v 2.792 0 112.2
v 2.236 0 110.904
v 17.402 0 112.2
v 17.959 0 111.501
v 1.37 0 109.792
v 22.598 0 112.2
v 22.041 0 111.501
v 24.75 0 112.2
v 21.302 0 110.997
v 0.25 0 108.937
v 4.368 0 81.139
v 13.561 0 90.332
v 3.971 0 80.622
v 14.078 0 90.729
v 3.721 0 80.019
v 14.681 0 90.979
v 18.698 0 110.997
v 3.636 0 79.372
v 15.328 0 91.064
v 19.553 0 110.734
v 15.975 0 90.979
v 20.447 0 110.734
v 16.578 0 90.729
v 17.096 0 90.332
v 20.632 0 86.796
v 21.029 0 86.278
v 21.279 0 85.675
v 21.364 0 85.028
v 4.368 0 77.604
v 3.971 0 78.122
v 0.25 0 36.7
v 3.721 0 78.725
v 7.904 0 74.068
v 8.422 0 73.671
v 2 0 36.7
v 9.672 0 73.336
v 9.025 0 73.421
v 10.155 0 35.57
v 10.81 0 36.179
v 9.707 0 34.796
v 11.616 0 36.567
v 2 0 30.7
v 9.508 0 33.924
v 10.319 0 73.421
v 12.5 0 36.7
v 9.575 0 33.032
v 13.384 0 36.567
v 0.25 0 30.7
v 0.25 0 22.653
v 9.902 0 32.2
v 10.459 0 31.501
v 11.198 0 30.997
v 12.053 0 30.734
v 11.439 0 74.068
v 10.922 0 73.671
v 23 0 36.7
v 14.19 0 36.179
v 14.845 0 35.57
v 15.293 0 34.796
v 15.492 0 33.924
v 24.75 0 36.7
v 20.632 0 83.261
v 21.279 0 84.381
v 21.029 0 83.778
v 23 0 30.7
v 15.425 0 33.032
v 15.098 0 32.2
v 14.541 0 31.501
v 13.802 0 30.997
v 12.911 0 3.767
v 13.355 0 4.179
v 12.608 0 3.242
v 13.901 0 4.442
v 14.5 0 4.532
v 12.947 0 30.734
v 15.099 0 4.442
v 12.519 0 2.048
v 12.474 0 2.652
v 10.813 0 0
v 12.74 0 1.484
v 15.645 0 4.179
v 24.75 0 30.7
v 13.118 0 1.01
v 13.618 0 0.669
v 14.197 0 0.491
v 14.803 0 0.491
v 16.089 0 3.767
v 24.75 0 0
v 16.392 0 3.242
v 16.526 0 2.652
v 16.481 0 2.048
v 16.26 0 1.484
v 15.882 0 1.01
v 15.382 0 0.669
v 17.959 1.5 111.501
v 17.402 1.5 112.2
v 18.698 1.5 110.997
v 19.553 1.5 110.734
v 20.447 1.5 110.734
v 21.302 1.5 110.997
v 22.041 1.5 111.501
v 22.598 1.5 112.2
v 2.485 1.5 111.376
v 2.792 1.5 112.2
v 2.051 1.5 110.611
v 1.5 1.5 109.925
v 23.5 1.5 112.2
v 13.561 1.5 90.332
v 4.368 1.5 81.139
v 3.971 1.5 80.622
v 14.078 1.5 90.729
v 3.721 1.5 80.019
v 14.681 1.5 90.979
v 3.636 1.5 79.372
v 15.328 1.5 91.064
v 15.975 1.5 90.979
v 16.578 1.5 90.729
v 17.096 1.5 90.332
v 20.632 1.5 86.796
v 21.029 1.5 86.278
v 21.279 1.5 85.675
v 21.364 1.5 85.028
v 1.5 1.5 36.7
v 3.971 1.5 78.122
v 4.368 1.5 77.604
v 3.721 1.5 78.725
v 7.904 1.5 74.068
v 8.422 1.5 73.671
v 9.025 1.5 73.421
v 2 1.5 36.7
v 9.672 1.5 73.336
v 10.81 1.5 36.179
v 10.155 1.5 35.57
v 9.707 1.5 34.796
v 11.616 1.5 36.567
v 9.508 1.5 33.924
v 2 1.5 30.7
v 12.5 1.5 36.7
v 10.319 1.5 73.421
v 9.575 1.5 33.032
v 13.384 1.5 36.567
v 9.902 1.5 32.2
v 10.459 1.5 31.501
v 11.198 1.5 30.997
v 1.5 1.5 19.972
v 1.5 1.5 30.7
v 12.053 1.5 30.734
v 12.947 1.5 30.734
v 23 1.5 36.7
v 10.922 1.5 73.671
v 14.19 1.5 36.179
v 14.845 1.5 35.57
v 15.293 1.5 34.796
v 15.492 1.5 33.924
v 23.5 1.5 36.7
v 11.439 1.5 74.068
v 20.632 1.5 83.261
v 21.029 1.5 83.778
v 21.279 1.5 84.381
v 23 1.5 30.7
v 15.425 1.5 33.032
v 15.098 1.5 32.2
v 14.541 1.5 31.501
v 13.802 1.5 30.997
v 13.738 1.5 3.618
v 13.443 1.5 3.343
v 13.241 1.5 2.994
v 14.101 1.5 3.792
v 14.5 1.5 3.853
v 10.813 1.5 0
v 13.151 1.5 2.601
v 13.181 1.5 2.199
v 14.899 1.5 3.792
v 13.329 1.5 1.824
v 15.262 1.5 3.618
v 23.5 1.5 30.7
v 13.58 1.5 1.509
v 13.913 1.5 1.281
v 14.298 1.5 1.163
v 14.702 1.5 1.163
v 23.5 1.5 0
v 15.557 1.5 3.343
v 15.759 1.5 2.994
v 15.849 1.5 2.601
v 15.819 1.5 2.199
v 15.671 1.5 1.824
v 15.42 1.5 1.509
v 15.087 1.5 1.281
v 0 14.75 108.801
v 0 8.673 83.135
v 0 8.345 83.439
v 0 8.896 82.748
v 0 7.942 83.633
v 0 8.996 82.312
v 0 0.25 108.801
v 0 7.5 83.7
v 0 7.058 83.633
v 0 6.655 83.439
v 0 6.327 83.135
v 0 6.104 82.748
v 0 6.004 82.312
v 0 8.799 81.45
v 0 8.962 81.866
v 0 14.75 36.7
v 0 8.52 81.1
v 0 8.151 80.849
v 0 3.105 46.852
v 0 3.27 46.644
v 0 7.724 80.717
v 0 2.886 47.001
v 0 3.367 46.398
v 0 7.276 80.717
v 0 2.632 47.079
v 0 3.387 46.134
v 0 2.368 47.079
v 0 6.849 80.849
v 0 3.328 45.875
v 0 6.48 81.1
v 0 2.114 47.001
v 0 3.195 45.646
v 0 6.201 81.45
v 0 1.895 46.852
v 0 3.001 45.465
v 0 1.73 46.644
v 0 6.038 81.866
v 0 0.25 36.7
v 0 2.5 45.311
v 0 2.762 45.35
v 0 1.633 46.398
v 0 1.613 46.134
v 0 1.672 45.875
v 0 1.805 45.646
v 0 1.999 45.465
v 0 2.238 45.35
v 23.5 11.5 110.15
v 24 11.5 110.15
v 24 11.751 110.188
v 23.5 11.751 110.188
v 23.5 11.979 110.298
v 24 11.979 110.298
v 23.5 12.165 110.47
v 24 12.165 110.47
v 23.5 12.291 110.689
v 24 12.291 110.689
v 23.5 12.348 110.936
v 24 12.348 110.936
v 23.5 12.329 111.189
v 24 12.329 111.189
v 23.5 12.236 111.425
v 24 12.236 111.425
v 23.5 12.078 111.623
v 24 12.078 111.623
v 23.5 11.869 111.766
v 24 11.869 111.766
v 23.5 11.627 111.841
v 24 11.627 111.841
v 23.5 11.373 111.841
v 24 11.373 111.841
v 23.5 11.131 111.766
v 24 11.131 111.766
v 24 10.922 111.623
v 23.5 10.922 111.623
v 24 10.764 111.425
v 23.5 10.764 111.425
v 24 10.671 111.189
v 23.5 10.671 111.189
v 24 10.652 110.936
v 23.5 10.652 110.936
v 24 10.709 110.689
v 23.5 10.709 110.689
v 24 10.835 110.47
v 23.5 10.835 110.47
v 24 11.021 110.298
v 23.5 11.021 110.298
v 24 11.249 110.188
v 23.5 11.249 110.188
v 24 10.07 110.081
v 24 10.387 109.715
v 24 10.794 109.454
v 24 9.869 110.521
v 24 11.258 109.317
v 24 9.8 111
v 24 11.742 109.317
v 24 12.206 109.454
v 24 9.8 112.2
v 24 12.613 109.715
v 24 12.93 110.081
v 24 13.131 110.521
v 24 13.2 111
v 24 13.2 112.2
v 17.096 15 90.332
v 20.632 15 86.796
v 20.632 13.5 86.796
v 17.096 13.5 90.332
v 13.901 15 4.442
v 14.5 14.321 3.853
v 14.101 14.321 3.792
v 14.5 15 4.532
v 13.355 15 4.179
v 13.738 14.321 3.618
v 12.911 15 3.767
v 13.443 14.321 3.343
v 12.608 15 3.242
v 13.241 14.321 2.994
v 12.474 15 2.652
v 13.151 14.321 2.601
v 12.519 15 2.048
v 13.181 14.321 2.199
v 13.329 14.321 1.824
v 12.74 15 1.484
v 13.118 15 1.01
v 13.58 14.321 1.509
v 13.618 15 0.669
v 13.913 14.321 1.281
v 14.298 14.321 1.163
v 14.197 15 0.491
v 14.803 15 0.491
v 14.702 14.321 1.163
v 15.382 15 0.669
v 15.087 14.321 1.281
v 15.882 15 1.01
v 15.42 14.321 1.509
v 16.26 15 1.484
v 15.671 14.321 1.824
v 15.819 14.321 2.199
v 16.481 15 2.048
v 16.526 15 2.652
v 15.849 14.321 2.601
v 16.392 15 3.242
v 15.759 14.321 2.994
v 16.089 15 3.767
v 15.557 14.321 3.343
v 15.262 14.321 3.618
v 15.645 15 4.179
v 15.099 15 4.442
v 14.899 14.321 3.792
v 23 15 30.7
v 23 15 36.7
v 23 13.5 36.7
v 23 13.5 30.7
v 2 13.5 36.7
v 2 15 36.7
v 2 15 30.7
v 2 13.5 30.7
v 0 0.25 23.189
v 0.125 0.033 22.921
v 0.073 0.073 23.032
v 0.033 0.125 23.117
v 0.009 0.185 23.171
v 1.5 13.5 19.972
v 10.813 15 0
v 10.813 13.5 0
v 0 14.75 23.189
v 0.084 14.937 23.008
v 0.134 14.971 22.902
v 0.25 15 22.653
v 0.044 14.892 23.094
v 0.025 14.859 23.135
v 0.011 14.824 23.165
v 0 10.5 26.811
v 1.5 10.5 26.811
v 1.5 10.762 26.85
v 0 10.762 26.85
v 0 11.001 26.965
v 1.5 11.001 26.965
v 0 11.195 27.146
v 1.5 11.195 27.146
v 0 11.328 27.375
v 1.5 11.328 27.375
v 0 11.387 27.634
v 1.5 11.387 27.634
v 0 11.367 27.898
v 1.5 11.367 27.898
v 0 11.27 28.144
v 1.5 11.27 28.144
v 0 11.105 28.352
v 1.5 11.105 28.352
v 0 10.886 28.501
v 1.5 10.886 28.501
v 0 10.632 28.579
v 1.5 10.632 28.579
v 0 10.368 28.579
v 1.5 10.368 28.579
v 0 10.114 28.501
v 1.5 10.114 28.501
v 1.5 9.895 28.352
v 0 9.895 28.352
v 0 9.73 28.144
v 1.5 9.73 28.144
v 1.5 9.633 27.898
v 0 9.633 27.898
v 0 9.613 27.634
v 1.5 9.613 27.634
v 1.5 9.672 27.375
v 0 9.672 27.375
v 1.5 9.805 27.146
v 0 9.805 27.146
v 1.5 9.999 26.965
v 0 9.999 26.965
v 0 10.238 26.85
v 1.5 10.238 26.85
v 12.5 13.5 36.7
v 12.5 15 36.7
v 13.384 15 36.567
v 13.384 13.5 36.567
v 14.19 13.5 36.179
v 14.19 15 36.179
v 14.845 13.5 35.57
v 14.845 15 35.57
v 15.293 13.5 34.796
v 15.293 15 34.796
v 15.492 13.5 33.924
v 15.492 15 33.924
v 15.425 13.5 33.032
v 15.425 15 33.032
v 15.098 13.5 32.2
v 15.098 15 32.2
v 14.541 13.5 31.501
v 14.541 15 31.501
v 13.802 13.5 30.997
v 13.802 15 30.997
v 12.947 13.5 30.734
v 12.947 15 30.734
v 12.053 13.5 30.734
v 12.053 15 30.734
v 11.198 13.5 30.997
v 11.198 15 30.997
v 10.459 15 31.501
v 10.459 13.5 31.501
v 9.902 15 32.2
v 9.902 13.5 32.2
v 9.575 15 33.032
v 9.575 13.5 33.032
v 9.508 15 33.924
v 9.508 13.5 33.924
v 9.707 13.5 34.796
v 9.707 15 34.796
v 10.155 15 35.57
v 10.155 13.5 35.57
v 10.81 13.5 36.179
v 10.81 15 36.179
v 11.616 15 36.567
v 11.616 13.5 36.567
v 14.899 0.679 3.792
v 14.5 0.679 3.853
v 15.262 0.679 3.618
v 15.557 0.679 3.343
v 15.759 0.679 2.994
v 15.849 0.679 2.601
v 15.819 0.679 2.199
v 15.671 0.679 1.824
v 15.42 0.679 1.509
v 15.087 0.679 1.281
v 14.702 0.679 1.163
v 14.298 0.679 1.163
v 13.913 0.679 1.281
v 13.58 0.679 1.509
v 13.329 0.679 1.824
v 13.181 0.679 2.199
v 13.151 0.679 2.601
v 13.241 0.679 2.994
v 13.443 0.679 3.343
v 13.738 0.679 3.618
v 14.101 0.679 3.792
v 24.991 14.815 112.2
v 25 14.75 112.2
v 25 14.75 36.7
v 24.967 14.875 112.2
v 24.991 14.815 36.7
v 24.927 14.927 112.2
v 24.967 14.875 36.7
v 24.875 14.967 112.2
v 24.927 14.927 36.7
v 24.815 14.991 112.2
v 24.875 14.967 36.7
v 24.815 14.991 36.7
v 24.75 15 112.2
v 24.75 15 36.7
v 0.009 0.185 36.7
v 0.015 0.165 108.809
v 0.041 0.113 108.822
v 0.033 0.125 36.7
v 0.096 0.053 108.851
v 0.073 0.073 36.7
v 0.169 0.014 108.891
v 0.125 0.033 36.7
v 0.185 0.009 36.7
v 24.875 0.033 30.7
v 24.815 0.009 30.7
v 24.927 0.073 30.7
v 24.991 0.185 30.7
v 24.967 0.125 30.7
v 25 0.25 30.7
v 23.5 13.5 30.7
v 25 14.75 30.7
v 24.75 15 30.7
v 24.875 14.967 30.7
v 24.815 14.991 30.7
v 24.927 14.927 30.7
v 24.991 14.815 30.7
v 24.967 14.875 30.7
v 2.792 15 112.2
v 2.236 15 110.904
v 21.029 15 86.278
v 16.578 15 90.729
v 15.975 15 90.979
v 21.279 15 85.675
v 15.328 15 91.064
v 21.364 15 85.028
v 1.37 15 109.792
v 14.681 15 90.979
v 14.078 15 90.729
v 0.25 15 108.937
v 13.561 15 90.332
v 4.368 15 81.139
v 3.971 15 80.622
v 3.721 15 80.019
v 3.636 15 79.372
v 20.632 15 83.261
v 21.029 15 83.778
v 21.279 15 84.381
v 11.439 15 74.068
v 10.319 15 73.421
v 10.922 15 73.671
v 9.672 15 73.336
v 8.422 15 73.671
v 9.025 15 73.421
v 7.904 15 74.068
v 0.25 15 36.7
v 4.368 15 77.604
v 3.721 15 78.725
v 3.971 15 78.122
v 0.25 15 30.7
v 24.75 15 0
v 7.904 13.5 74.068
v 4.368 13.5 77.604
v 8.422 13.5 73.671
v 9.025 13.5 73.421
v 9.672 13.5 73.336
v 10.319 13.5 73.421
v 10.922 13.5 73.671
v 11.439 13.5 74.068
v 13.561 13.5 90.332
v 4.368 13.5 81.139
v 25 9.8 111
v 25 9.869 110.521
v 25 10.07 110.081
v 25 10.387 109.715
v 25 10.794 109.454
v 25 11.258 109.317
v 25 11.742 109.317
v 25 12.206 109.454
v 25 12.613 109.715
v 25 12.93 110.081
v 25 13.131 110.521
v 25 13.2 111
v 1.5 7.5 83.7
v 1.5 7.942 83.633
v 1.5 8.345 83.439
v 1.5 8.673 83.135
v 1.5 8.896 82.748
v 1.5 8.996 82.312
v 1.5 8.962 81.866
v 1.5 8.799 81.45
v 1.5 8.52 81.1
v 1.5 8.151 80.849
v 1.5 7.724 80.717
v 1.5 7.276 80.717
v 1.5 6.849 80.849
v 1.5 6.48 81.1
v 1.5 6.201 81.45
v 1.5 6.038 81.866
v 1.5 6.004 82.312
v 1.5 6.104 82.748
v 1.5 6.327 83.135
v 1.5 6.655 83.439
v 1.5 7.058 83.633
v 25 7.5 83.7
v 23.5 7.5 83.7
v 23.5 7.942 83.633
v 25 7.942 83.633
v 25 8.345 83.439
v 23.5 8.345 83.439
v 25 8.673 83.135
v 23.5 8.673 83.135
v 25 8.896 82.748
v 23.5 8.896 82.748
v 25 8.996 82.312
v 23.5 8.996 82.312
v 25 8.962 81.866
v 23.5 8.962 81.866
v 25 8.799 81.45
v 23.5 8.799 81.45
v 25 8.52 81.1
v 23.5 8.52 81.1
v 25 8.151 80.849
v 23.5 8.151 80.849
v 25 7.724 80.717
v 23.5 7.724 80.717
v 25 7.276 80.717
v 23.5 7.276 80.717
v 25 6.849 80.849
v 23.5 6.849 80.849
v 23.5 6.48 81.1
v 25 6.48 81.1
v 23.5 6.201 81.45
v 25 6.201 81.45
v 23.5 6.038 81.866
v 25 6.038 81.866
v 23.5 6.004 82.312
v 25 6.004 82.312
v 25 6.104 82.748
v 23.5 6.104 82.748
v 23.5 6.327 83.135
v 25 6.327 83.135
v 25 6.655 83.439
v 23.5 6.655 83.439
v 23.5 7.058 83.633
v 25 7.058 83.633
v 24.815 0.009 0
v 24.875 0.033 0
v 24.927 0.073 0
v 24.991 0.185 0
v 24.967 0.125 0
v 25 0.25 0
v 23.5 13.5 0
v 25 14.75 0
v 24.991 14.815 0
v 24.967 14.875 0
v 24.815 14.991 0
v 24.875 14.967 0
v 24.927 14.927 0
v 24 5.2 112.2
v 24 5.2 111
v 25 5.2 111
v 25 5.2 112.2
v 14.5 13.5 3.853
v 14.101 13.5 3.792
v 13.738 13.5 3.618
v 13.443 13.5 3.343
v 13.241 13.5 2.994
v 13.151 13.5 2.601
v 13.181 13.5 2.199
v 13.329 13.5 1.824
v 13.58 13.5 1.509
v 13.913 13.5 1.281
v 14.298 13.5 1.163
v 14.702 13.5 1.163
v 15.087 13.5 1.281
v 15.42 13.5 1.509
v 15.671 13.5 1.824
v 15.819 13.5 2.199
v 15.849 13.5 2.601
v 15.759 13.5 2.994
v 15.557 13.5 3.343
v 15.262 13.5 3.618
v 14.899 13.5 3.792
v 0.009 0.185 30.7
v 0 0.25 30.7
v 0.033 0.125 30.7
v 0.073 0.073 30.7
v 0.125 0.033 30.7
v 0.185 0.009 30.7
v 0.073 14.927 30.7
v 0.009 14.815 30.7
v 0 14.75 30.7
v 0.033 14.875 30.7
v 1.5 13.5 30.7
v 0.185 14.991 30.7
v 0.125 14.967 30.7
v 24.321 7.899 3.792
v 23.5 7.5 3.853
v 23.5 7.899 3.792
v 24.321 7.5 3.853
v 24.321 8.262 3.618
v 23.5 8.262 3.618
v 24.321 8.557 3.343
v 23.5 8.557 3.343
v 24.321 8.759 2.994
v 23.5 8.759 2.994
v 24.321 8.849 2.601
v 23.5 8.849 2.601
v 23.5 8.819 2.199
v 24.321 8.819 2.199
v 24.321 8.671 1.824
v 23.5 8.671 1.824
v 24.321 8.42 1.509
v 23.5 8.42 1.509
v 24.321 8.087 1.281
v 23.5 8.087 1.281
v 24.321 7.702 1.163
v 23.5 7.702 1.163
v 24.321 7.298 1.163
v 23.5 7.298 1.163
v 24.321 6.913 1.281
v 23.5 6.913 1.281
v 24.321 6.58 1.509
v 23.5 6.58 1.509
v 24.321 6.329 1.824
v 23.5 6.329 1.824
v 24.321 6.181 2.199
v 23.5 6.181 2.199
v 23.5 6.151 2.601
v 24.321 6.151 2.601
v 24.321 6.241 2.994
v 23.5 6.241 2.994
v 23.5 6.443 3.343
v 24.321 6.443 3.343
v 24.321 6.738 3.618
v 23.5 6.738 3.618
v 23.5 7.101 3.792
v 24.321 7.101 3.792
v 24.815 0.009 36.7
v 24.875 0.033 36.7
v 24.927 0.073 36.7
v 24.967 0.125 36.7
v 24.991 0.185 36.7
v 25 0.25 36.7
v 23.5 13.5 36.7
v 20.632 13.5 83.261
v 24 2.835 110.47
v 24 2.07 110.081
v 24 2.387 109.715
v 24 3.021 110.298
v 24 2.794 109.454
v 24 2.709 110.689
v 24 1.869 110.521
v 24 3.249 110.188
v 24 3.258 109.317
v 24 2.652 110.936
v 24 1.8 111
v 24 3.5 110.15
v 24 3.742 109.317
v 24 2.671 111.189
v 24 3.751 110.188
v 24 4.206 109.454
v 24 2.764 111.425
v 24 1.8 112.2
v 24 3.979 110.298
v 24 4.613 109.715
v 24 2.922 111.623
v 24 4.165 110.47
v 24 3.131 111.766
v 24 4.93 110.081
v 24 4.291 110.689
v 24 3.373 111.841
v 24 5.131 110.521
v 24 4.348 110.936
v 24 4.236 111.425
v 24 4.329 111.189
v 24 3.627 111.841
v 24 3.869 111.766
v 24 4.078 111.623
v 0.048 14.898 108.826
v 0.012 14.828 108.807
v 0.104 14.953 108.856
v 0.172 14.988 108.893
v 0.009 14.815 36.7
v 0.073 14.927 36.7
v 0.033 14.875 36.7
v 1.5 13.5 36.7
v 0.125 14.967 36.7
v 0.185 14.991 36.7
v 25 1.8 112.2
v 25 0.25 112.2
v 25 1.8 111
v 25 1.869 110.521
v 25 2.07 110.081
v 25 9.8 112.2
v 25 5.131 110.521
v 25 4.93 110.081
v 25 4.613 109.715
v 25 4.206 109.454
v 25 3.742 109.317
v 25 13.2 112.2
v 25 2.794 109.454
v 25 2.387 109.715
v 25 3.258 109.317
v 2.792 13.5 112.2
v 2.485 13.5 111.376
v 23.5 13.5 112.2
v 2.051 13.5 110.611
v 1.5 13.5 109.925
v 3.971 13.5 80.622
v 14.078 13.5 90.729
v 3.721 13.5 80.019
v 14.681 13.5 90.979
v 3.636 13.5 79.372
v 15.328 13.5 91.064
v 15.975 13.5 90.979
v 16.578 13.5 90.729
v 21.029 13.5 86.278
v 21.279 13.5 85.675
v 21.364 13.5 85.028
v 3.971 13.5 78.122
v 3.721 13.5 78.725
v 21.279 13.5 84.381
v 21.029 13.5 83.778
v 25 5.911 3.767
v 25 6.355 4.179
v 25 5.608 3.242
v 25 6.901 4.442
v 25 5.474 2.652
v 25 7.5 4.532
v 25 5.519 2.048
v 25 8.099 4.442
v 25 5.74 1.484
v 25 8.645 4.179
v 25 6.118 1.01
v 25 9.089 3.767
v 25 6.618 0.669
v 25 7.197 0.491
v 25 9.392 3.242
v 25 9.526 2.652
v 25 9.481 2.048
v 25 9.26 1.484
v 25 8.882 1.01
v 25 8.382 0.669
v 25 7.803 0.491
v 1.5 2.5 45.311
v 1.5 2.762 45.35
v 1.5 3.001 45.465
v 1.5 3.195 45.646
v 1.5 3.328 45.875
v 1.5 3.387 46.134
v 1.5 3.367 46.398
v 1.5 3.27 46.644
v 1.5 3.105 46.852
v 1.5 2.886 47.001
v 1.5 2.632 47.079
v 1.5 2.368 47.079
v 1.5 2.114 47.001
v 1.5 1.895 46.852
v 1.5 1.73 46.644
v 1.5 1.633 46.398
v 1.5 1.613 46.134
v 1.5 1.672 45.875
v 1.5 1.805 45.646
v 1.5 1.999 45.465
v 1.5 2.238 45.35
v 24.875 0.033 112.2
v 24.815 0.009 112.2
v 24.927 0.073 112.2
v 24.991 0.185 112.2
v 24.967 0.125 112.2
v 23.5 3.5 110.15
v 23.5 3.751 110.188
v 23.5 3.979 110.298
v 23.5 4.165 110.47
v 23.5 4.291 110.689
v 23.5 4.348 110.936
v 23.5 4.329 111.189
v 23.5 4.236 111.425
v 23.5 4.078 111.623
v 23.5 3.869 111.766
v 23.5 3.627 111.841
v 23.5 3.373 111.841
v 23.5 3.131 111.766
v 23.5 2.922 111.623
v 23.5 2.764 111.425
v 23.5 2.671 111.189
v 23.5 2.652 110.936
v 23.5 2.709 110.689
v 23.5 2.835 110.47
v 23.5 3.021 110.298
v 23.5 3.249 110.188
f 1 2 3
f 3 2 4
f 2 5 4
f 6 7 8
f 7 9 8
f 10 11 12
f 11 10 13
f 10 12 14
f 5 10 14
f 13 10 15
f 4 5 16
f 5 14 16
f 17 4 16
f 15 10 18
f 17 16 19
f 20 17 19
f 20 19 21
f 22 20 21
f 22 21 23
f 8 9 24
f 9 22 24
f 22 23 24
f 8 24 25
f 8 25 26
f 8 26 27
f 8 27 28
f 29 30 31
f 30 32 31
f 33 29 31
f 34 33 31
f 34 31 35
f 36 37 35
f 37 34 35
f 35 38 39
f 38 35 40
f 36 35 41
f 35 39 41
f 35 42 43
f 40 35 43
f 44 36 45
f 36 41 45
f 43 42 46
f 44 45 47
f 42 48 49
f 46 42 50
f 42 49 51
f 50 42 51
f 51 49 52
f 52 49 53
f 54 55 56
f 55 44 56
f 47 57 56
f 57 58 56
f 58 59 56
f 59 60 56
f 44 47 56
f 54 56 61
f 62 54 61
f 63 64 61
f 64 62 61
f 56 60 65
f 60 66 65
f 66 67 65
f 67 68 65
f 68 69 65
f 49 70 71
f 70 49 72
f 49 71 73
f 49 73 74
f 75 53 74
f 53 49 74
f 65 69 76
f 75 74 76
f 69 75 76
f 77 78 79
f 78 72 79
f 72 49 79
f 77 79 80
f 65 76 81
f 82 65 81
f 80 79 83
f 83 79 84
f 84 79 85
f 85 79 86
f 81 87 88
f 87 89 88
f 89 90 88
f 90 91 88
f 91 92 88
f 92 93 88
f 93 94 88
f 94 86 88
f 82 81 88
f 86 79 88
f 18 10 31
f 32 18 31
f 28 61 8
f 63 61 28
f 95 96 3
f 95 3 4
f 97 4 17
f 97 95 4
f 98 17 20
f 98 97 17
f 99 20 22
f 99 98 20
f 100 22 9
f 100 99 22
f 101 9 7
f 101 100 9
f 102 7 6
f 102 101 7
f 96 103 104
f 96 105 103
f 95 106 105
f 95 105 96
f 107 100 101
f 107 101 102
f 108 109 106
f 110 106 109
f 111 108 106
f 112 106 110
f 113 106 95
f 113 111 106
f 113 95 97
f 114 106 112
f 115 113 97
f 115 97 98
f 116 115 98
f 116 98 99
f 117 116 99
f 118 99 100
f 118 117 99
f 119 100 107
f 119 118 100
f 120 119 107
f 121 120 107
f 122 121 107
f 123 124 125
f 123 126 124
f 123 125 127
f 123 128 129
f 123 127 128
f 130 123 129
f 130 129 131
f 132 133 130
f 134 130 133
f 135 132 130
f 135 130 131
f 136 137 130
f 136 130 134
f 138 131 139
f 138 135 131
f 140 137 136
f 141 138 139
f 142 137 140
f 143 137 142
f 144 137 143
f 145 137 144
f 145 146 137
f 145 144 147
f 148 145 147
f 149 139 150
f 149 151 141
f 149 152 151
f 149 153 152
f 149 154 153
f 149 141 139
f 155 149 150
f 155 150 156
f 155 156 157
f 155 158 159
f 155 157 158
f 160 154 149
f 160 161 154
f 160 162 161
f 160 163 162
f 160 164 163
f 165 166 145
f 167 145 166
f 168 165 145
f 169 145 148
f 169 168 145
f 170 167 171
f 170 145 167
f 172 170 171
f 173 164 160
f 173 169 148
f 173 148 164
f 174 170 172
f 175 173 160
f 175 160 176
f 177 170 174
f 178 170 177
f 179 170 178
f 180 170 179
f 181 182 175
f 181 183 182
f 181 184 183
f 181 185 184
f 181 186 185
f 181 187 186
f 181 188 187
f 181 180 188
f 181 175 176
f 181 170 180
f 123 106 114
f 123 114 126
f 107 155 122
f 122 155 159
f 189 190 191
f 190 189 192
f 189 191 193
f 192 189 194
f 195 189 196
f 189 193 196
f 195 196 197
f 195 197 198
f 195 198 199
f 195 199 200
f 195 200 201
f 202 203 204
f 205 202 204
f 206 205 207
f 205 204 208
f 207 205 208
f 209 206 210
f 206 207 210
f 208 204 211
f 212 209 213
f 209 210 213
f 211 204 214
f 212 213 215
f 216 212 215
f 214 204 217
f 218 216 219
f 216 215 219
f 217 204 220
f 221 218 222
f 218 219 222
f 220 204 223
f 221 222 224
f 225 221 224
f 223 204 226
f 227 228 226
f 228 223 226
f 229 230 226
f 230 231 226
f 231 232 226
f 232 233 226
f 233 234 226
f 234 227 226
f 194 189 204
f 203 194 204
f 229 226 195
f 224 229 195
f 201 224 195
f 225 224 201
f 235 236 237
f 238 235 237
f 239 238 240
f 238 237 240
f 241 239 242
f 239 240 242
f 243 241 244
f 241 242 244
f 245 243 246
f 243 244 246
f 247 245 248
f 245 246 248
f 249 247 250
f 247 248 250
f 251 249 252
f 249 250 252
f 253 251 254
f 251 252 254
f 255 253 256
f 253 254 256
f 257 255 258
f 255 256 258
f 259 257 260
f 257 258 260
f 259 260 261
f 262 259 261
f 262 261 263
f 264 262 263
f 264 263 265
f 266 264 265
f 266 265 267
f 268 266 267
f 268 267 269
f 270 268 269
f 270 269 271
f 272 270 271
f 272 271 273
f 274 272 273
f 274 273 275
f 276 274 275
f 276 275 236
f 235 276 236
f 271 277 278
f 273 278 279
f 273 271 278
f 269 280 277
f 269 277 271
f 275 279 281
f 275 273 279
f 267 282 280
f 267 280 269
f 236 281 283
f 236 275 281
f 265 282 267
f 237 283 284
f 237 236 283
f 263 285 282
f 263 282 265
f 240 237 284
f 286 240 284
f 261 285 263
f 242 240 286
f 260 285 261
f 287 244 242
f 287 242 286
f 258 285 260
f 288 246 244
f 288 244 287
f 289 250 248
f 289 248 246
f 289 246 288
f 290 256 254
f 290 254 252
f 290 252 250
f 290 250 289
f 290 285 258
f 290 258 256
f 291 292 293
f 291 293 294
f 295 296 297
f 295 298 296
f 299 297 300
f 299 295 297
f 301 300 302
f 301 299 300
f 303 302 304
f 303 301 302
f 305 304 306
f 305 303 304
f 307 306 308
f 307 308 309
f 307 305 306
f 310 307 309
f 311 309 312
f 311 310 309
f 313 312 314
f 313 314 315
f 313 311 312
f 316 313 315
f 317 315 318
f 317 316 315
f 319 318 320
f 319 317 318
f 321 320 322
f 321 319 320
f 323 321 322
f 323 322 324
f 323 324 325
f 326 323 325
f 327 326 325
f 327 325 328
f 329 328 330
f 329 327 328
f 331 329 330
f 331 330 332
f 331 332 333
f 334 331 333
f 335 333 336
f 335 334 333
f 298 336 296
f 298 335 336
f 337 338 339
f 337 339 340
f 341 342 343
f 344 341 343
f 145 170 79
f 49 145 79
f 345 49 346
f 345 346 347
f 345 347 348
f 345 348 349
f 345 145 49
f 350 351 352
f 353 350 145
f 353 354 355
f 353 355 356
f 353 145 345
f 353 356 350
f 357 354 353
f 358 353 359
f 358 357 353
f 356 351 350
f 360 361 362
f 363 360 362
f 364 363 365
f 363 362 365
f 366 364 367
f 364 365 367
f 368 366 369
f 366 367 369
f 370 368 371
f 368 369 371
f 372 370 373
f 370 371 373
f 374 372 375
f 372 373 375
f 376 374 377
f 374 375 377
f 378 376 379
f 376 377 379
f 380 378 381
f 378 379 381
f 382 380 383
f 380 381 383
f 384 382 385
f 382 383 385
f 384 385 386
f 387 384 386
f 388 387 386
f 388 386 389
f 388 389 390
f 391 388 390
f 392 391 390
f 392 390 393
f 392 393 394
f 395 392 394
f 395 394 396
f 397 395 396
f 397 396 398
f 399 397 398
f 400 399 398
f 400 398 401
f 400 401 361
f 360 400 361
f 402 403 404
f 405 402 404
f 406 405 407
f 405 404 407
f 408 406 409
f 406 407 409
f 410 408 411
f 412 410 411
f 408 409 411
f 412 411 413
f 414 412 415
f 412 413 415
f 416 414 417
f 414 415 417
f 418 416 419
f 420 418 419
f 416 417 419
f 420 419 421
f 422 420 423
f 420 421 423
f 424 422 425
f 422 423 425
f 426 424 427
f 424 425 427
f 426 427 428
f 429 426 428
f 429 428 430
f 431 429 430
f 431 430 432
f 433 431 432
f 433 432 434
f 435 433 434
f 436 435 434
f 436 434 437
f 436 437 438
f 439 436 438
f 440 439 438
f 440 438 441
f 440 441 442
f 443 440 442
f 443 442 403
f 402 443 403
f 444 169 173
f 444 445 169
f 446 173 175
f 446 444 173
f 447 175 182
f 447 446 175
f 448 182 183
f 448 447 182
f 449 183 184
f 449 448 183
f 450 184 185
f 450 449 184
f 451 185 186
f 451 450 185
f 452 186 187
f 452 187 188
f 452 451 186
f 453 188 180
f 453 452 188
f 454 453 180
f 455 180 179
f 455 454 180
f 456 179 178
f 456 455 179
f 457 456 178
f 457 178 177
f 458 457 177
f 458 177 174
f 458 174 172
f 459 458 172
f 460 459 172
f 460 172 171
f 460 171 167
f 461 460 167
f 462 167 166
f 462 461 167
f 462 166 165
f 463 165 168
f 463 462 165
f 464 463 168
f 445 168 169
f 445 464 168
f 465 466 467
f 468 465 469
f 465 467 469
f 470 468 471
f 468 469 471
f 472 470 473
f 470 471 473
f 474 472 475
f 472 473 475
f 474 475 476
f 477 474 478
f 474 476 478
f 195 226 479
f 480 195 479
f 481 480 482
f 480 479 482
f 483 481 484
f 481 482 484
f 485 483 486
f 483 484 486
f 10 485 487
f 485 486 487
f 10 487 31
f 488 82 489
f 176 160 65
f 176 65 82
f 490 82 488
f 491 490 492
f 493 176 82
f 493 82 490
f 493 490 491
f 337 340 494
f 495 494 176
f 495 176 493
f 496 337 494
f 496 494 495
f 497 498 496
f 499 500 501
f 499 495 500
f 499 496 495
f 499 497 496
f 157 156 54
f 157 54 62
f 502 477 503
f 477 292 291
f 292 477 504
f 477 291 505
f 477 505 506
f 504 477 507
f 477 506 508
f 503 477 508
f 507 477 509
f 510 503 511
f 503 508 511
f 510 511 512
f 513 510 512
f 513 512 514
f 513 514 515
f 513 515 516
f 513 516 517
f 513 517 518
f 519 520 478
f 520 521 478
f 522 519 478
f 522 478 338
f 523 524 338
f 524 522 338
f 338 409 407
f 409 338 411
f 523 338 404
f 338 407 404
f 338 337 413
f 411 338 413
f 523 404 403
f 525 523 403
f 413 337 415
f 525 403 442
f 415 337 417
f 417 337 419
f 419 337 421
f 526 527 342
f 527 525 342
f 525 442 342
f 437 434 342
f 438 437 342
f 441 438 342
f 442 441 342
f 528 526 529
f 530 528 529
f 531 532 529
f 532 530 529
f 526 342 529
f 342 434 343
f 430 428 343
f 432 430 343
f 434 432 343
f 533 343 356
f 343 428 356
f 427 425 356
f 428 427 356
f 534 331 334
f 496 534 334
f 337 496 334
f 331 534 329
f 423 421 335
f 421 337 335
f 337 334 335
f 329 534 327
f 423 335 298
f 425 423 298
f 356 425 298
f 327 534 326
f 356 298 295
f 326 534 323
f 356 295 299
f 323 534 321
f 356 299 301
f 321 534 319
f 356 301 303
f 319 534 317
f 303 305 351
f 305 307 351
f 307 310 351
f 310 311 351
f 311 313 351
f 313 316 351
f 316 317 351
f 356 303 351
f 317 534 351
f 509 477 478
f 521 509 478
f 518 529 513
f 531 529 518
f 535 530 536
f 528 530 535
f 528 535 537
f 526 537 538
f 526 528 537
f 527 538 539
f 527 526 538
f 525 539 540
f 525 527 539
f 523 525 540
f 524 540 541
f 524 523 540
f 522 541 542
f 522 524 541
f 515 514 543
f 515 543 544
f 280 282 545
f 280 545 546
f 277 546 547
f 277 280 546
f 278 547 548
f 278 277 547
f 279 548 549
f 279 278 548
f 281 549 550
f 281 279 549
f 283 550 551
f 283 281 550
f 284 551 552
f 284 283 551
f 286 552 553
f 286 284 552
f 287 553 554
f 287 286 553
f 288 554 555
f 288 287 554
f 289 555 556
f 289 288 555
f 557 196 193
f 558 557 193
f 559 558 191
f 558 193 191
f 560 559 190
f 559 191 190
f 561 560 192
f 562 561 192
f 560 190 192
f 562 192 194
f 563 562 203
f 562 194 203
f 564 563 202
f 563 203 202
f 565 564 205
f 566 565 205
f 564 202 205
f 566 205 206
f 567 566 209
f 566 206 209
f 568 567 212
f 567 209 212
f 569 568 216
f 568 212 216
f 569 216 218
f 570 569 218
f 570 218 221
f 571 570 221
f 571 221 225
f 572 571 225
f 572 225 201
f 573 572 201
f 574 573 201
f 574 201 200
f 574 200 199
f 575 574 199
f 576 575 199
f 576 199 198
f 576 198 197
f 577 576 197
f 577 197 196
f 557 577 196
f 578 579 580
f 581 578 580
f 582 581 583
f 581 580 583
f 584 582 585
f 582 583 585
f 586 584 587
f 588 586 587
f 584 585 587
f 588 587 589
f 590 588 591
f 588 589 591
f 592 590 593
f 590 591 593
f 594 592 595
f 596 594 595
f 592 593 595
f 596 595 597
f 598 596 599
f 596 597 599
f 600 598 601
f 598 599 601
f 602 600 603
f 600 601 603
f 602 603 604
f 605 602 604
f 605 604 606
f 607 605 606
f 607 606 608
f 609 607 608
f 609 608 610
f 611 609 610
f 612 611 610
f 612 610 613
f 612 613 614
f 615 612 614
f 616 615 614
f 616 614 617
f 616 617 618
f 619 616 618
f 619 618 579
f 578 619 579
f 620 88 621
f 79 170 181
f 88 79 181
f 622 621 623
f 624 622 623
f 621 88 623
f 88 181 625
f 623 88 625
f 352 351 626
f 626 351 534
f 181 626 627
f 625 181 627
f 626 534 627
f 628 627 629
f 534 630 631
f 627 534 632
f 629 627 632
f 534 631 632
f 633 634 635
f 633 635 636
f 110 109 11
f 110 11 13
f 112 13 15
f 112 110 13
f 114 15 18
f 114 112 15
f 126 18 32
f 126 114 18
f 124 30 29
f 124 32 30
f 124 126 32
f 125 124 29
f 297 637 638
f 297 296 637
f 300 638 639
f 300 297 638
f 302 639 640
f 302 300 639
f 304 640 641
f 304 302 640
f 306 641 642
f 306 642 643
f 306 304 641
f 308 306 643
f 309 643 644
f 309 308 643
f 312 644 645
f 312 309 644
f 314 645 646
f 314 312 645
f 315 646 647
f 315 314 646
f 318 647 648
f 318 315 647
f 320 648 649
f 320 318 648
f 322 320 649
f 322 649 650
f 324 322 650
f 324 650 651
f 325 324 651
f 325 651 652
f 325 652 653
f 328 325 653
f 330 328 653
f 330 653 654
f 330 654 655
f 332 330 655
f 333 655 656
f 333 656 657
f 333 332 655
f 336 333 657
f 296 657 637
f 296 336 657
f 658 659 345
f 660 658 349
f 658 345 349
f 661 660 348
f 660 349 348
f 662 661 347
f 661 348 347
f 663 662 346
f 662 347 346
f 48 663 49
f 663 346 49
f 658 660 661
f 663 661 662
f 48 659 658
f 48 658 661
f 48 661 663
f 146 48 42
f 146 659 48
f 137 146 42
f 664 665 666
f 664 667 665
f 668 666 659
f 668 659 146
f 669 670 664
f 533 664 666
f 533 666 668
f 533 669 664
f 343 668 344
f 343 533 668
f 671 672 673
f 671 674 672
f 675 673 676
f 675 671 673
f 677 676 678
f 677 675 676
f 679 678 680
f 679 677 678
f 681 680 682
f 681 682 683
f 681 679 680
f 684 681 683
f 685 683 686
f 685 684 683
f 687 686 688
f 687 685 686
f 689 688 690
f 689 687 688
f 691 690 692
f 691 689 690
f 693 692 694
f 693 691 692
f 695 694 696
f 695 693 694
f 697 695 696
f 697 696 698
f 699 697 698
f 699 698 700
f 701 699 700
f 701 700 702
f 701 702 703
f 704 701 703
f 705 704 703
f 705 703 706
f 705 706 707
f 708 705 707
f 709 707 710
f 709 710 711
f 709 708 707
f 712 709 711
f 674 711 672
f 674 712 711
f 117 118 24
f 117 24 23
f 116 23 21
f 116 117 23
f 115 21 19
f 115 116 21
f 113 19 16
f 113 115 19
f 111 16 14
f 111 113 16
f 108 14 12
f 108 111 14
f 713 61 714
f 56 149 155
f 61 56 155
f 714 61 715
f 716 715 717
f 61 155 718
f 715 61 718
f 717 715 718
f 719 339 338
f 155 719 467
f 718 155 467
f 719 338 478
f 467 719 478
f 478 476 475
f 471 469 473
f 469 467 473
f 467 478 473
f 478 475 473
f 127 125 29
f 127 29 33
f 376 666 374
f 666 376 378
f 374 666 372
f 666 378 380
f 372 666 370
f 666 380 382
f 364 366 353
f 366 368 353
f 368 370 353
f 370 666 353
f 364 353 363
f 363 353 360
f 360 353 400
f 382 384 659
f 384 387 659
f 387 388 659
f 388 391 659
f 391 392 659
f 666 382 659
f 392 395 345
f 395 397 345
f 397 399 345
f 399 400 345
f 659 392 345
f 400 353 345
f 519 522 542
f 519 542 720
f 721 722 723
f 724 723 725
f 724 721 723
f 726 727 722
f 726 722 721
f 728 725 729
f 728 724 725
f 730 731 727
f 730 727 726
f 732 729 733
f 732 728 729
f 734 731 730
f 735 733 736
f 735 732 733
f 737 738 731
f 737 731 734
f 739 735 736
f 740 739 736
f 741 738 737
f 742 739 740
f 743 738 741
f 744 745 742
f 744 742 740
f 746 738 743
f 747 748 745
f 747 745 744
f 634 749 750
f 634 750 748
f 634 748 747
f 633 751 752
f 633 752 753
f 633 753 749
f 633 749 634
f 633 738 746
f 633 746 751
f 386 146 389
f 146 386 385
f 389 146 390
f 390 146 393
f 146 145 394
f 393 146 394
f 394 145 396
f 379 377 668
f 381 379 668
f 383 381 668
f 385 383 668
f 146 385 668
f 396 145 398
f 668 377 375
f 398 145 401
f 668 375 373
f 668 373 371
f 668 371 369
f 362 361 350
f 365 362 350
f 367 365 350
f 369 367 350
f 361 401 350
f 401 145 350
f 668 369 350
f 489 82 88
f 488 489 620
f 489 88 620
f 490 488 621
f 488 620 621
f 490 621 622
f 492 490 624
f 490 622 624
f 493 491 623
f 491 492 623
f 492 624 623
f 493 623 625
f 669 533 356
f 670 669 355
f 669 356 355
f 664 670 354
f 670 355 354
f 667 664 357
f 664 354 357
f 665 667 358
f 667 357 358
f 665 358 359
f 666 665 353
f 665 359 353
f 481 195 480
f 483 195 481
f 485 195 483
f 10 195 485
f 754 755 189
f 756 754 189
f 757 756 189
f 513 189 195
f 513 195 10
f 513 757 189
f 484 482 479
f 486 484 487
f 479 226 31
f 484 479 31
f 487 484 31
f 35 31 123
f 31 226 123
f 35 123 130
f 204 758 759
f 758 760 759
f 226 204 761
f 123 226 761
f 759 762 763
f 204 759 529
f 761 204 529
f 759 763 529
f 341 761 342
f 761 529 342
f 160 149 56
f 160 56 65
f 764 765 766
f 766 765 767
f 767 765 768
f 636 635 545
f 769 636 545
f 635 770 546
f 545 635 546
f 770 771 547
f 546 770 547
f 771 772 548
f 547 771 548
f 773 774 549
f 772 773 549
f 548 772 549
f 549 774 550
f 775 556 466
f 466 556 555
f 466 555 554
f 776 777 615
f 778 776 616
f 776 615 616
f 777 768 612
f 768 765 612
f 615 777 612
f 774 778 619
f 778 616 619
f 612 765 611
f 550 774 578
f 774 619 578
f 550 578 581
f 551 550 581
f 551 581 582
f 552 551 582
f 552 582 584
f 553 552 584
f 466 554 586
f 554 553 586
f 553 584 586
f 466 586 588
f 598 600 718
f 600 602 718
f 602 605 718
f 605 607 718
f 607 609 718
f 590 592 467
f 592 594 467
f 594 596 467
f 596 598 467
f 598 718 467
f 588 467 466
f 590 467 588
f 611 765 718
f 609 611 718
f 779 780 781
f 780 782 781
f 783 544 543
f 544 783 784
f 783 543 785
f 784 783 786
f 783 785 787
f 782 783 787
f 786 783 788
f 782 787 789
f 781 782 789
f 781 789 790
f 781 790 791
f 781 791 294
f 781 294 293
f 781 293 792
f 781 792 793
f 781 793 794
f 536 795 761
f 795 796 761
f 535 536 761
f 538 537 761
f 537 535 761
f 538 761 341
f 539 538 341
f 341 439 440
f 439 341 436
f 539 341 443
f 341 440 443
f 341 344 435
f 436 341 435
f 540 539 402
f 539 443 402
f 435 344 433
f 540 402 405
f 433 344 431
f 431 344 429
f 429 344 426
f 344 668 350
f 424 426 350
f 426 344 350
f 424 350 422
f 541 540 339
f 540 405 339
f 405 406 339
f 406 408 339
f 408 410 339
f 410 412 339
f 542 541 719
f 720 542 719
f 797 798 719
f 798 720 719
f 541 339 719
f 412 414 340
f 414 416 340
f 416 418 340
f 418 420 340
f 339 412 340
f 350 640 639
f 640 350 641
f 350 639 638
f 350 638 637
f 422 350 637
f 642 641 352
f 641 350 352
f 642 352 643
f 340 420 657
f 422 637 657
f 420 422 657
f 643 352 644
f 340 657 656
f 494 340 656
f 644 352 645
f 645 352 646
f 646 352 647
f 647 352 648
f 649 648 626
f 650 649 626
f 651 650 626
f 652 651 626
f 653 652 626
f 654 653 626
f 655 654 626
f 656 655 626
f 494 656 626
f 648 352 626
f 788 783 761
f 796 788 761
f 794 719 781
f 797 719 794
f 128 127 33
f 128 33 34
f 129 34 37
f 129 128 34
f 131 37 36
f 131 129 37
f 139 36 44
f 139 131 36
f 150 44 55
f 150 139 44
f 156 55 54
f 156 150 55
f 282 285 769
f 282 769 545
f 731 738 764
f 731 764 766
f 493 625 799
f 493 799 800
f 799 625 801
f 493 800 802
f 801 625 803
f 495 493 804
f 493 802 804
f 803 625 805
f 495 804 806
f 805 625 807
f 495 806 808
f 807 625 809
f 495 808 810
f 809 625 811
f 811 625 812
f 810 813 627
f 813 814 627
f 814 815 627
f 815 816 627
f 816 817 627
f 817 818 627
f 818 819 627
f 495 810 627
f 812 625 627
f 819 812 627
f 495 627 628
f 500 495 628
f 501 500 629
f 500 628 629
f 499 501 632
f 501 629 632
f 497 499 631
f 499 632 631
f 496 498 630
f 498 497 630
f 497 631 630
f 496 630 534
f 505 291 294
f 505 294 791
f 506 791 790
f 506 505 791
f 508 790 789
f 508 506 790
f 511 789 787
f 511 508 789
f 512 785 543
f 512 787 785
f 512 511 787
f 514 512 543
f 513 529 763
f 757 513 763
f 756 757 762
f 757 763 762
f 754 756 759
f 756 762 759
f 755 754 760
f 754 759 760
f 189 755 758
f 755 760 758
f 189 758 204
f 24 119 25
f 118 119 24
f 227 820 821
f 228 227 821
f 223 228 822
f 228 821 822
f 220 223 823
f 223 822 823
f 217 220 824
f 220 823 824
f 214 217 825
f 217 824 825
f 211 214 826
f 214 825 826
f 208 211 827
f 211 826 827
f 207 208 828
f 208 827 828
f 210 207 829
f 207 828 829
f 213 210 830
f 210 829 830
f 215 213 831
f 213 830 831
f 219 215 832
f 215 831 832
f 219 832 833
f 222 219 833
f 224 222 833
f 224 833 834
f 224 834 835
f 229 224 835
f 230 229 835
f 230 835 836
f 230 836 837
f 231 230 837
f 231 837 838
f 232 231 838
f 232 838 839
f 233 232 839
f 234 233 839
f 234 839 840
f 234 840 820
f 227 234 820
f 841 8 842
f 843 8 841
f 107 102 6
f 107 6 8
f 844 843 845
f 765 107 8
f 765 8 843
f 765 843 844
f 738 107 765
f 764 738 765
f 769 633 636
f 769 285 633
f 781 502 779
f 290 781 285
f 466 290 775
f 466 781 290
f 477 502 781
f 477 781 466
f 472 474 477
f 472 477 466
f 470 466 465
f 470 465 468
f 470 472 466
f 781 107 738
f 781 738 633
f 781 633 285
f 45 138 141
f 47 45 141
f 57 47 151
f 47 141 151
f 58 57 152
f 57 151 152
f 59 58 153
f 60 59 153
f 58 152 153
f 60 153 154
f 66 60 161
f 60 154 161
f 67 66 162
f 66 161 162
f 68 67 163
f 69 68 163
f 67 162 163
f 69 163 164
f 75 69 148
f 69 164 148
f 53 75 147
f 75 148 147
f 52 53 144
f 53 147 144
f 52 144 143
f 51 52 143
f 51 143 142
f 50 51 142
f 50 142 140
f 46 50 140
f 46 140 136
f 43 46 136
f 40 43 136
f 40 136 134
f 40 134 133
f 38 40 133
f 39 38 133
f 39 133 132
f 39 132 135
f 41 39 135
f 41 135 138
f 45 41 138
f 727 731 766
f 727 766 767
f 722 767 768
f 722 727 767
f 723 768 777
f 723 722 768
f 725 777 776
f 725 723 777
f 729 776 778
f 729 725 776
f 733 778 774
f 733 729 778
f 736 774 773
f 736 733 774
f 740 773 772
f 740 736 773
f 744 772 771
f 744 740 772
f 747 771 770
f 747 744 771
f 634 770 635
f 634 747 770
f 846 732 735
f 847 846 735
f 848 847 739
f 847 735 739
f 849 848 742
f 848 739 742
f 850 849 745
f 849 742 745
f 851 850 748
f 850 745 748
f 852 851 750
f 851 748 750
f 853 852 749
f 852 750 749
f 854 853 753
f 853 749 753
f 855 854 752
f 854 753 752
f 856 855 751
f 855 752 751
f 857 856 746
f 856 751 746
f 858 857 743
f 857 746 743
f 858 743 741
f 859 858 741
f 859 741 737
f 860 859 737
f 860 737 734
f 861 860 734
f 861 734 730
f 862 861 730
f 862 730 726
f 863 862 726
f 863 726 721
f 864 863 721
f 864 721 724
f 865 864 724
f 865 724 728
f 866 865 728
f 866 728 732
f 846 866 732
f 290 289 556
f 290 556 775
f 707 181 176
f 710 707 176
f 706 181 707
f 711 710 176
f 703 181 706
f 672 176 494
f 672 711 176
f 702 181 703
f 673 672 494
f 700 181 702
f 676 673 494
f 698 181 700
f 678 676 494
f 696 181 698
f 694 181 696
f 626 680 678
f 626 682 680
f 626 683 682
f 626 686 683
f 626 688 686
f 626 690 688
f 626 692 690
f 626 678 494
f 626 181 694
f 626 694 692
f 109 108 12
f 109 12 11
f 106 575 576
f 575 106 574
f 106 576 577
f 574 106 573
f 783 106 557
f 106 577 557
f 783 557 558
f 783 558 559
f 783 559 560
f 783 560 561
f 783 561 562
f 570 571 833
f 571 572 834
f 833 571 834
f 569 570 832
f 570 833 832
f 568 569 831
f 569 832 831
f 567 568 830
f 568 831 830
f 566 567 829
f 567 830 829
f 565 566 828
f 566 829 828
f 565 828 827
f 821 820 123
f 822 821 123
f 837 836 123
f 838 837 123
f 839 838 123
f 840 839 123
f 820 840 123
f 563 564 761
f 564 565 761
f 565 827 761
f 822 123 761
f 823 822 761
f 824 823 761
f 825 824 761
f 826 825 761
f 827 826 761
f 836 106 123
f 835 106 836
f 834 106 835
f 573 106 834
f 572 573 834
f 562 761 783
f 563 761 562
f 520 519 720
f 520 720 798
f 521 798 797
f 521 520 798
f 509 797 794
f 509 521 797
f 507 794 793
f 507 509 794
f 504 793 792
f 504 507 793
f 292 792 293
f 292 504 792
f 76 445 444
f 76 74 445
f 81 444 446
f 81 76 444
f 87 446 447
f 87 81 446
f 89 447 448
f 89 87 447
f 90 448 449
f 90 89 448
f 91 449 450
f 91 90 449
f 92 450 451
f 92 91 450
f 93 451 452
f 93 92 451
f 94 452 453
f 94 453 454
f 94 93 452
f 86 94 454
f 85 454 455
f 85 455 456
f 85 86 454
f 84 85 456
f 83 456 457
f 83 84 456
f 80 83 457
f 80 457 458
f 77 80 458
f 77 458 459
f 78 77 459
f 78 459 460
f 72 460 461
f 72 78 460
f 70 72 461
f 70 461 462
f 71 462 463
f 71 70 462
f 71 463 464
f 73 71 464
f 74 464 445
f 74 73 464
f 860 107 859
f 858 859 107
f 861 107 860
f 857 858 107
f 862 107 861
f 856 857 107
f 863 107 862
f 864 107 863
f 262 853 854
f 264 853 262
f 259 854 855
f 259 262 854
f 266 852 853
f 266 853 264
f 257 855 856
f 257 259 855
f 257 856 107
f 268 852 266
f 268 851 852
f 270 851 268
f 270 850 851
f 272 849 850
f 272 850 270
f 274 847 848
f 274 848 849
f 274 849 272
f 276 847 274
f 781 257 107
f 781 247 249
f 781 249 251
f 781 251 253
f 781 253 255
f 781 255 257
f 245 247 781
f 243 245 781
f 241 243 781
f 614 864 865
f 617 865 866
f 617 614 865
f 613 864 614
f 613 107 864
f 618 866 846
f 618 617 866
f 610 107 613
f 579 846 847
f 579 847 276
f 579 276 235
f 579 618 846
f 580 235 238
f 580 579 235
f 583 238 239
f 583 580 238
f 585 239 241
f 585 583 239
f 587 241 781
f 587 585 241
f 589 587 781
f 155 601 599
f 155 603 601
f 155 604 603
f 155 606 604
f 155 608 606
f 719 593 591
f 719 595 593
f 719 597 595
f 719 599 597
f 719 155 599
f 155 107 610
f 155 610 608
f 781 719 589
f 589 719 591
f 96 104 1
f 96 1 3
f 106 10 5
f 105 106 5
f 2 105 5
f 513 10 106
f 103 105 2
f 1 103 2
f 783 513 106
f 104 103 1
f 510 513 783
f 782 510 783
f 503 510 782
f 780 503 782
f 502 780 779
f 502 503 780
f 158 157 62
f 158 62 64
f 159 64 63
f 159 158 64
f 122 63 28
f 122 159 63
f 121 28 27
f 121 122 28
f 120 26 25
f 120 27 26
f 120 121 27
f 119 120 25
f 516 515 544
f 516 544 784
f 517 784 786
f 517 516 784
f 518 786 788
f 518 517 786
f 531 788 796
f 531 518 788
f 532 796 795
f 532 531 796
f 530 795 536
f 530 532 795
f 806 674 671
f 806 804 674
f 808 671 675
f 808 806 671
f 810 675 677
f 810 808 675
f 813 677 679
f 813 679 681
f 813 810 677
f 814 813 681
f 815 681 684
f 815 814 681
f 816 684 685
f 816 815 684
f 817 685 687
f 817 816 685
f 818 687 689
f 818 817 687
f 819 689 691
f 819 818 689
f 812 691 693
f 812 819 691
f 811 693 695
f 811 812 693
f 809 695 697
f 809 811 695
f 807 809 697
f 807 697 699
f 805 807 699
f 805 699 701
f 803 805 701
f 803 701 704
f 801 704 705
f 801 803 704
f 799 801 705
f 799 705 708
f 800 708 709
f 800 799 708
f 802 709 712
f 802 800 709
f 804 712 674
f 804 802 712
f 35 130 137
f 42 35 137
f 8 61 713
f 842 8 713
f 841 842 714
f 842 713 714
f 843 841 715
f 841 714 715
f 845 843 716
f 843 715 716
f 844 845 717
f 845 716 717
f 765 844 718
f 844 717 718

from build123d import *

# Parameters (mm, degrees)
SKETCH_1_W              = 22
SKETCH_1_H              = 12
EXTRUDE_1_DEPTH         = 112.2
SKETCH_2_R              = 3
SKETCH_2_W              = 2
SKETCH_2_H              = 6
CUT_EXTRUDE_1_DEPTH     = 116.926010886
SKETCH_3_R              = 1.5
CUT_EXTRUDE_2_DEPTH     = 116.926010886
CUT_EXTRUDE_5_DEPTH     = 116.926010886
HOLE_WIZARD_2_561_D     = 1.778
HOLE_WIZARD_2_561_DEPTH = 1.5
CUT_EXTRUDE_7_DEPTH     = 116.926010886
CUT_EXTRUDE_8_REACH     = 117.926
SKETCH_13_R             = 0.85
CUT_EXTRUDE_START       = 24
CUT_EXTRUDE_9_OUTLINE_R = 0.85
CUT_EXTRUDE_9_DEPTH     = 1
CUT_EXTRUDE_10_DEPTH    = 116.74147918


# Read off the part's stored shape, not the designer's step: Вырез-Вытянуть9
with BuildPart() as part:
    # Эскиз1 → Вытянуть1 (new body)
    with BuildSketch(Plane.XY):
        with BuildLine():
            Line((0.25, 0), (24.75, 0))
            ThreePointArc((24.75, 0), (24.926776695, 0.073223305), (25, 0.25))
            Line((25, 0.25), (25, 14.75))
            ThreePointArc((25, 14.75), (24.926776695, 14.926776695), (24.75, 15))
            Line((24.75, 15), (0.25, 15))
            ThreePointArc((0.25, 15), (0.073223305, 14.926776695), (0, 14.75))
            Line((0, 14.75), (0, 0.25))
            ThreePointArc((0, 0.25), (0.073223305, 0.073223305), (0.25, 0))
        make_face()
        with Locations((12.5, 7.5)):
            Rectangle(SKETCH_1_W, SKETCH_1_H, mode=Mode.SUBTRACT)
    extrude(amount=EXTRUDE_1_DEPTH)

    # Эскиз2 → Вырез-Вытянуть1 (cut, through all)
    with BuildSketch(Plane(origin=(0, 15, 0), x_dir=(1, 0, 0), z_dir=(0, 1, 0))):
        with Locations(Location((12.5, -33.7, 0), (0, 0, 270))):
            Circle(SKETCH_2_R)
        with BuildLine():
            Line((13.560660172, -90.331727984), (4.368272016, -81.139339828))
            ThreePointArc((4.368272016, -81.139339828), (3.636038969, -79.371572875), (4.368272016, -77.603805922))
            Line((4.368272016, -77.603805922), (7.903805922, -74.068272016))
            ThreePointArc((7.903805922, -74.068272016), (9.671572875, -73.336038969), (11.439339828, -74.068272016))
            Line((11.439339828, -74.068272016), (20.631727984, -83.260660172))
            ThreePointArc((20.631727984, -83.260660172), (21.363961031, -85.028427125), (20.631727984, -86.796194078))
            Line((20.631727984, -86.796194078), (17.096194078, -90.331727984))
            ThreePointArc((17.096194078, -90.331727984), (15.328427125, -91.063961031), (13.560660172, -90.331727984))
        make_face()
        with Locations((1, -33.7)):
            Rectangle(SKETCH_2_W, SKETCH_2_H)
        with Locations((24, -33.7)):
            Rectangle(SKETCH_2_W, SKETCH_2_H)
    extrude(amount=-CUT_EXTRUDE_1_DEPTH, mode=Mode.SUBTRACT)

    # Эскиз3 → Вырез-Вытянуть2 (cut, through all)
    with BuildSketch(Plane.ZY):
        with Locations((82.2, 7.5)):
            Circle(SKETCH_3_R)
    extrude(amount=-CUT_EXTRUDE_2_DEPTH, mode=Mode.SUBTRACT)

    # Эскиз6 → Вырез-Вытянуть5 (cut, through all)
    with BuildSketch(Plane(origin=(0, 15, 0), x_dir=(1, 0, 0), z_dir=(0, 1, 0))):
        Polygon((110.629924484, 214.057863156), (10.813103606, 0), (0, -23.188775515), (-99.816820878, -237.246638671), (-527.932547189, -37.612996915), (-317.485801828, 413.691504911), align=None)
    extrude(amount=-CUT_EXTRUDE_5_DEPTH, mode=Mode.SUBTRACT)

    # Эскиз8 → Зенковка для  винта с плоской головкой #2(100)2 (revolve, cut)
    with BuildSketch(Plane(origin=(14.5, 15, 2.5), x_dir=(0, 0, 1), z_dir=(1, 0, 0))):
        Polygon((0, 0), (0, 1.5), (1.35255, 1.5), (1.35255, 0.67945), (2.032, 0), align=None)
    revolve(axis=Axis((14.5, 21.35, 2.5), (0, -1, 0)), mode=Mode.SUBTRACT)

    # Эскиз8 at point 2 (carried to point 2, square into its face) → Зенковка для  винта с плоской головкой #2(100)2 at 2 (revolve, cut)
    with BuildSketch(Plane(origin=(14.5, 0, 2.5), x_dir=(0, 0, 1), z_dir=(-1, 0, 0))):
        Polygon((0, 0), (0, 1.5), (1.35255, 1.5), (1.35255, 0.67945), (2.032, 0), align=None)
    revolve(axis=Axis((14.5, -6.35, 2.5), (0, 1, 0)), mode=Mode.SUBTRACT)

    # Эскиз8 at point 3 (carried to point 3, square into its face) → Зенковка для  винта с плоской головкой #2(100)2 at 3 (revolve, cut)
    with BuildSketch(Plane(origin=(25, 7.5, 2.5), x_dir=(0, 0, 1), z_dir=(0, -1, 0))):
        Polygon((0, 0), (0, 1.5), (1.35255, 1.5), (1.35255, 0.67945), (2.032, 0), align=None)
    revolve(axis=Axis((31.35, 7.5, 2.5), (-1, 0, 0)), mode=Mode.SUBTRACT)

    # Отверстие обработанное метчиком #2-561
    with Locations(Plane.ZY):
        with Locations((27.7, 10.5), (46.2, 2.5)):
            Hole(HOLE_WIZARD_2_561_D / 2, depth=HOLE_WIZARD_2_561_DEPTH)

    # Эскиз12 → Вырез-Вытянуть7 (cut, through all)
    with BuildSketch(Plane.XZ.offset(-15)):
        with BuildLine():
            ThreePointArc((2.791502622, 112.2), (2.947626291, 112.942789468), (3, 113.7))
            ThreePointArc((3, 113.7), (-7.263139721, 116.45), (0.25, 108.936860279))
            Line((0.25, 108.936860279), (0.25, 112.2))
            Line((0.25, 112.2), (2.791502622, 112.2))
        make_face()
        with BuildLine():
            Line((0.25, 112.2), (0.25, 108.936860279))
            ThreePointArc((0.25, 108.936860279), (1.839177493, 110.320423298), (2.791502622, 112.2))
            Line((2.791502622, 112.2), (0.25, 112.2))
        make_face()
    extrude(amount=CUT_EXTRUDE_7_DEPTH, mode=Mode.SUBTRACT)

    # Эскиз13 → Вырез-Вытянуть8 (cut, up to next)
    with BuildSketch(Plane(origin=(25, 0, 0), x_dir=(0, 0, -1), z_dir=(1, 0, 0)), mode=Mode.PRIVATE) as cut_extrude_8_sk1:
        with Locations((-111, 11.5)):
            Circle(SKETCH_13_R)
    cut_extrude_8_tool1 = extrude(cut_extrude_8_sk1.sketch, amount=-CUT_EXTRUDE_8_REACH, mode=Mode.PRIVATE) & part.part
    # Эскиз13 → Вырез-Вытянуть8 (cut, up to next)
    with BuildSketch(Plane(origin=(25, 0, 0), x_dir=(0, 0, -1), z_dir=(1, 0, 0)), mode=Mode.PRIVATE) as cut_extrude_8_sk2:
        with Locations((-111, 3.5)):
            Circle(SKETCH_13_R)
    cut_extrude_8_tool2 = extrude(cut_extrude_8_sk2.sketch, amount=-CUT_EXTRUDE_8_REACH, mode=Mode.PRIVATE) & part.part
    add(cut_extrude_8_tool1.solids().sort_by_distance((25, 11.5, 111))[0], mode=Mode.SUBTRACT)
    add(cut_extrude_8_tool2.solids().sort_by_distance((25, 3.5, 111))[0], mode=Mode.SUBTRACT)

    # Вырез-Вытянуть9 outline → Вырез-Вытянуть9 (cut)
    # profile 1 of 2: a face of its own
    with BuildSketch(Plane.YZ.offset(CUT_EXTRUDE_START)):
        with BuildLine():
            Line((1.8, 112.2), (1.8, 111))
            ThreePointArc((1.8, 111), (3.5, 109.3), (5.2, 111))
            Line((5.2, 111), (5.2, 112.2))
            Line((5.2, 112.2), (1.8, 112.2))
        make_face()
        with Locations((3.5, 111)):
            Circle(CUT_EXTRUDE_9_OUTLINE_R, mode=Mode.SUBTRACT)
    # profile 2 of 2: a face of its own
    with BuildSketch(Plane.YZ.offset(CUT_EXTRUDE_START)):
        with BuildLine():
            Line((13.2, 112.2), (9.8, 112.2))
            Line((9.8, 112.2), (9.8, 111))
            ThreePointArc((9.8, 111), (11.5, 109.3), (13.2, 111))
            Line((13.2, 111), (13.2, 112.2))
        make_face()
        with Locations((11.5, 111)):
            Circle(CUT_EXTRUDE_9_OUTLINE_R, mode=Mode.SUBTRACT)
    extrude(amount=CUT_EXTRUDE_9_DEPTH, mode=Mode.SUBTRACT)

    # Эскиз14 → Вырез-Вытянуть10 (cut, through all)
    with BuildSketch(Plane(origin=(0, 1.5, 0), x_dir=(1, 0, 0), z_dir=(0, 1, 0))):
        with BuildLine():
            Line((-102.051180376, -319.098845535), (17.401923789, -112.2))
            ThreePointArc((17.401923789, -112.2), (20, -110.7), (22.598076211, -112.2))
            Line((22.598076211, -112.2), (142.051180376, -319.098845535))
            Line((142.051180376, -319.098845535), (142.051180376, -796.911262195))
            Line((142.051180376, -796.911262195), (-102.051180376, -796.911262195))
            Line((-102.051180376, -796.911262195), (-102.051180376, -319.098845535))
        make_face()
    extrude(amount=-CUT_EXTRUDE_10_DEPTH, mode=Mode.SUBTRACT)


solid = part.part
